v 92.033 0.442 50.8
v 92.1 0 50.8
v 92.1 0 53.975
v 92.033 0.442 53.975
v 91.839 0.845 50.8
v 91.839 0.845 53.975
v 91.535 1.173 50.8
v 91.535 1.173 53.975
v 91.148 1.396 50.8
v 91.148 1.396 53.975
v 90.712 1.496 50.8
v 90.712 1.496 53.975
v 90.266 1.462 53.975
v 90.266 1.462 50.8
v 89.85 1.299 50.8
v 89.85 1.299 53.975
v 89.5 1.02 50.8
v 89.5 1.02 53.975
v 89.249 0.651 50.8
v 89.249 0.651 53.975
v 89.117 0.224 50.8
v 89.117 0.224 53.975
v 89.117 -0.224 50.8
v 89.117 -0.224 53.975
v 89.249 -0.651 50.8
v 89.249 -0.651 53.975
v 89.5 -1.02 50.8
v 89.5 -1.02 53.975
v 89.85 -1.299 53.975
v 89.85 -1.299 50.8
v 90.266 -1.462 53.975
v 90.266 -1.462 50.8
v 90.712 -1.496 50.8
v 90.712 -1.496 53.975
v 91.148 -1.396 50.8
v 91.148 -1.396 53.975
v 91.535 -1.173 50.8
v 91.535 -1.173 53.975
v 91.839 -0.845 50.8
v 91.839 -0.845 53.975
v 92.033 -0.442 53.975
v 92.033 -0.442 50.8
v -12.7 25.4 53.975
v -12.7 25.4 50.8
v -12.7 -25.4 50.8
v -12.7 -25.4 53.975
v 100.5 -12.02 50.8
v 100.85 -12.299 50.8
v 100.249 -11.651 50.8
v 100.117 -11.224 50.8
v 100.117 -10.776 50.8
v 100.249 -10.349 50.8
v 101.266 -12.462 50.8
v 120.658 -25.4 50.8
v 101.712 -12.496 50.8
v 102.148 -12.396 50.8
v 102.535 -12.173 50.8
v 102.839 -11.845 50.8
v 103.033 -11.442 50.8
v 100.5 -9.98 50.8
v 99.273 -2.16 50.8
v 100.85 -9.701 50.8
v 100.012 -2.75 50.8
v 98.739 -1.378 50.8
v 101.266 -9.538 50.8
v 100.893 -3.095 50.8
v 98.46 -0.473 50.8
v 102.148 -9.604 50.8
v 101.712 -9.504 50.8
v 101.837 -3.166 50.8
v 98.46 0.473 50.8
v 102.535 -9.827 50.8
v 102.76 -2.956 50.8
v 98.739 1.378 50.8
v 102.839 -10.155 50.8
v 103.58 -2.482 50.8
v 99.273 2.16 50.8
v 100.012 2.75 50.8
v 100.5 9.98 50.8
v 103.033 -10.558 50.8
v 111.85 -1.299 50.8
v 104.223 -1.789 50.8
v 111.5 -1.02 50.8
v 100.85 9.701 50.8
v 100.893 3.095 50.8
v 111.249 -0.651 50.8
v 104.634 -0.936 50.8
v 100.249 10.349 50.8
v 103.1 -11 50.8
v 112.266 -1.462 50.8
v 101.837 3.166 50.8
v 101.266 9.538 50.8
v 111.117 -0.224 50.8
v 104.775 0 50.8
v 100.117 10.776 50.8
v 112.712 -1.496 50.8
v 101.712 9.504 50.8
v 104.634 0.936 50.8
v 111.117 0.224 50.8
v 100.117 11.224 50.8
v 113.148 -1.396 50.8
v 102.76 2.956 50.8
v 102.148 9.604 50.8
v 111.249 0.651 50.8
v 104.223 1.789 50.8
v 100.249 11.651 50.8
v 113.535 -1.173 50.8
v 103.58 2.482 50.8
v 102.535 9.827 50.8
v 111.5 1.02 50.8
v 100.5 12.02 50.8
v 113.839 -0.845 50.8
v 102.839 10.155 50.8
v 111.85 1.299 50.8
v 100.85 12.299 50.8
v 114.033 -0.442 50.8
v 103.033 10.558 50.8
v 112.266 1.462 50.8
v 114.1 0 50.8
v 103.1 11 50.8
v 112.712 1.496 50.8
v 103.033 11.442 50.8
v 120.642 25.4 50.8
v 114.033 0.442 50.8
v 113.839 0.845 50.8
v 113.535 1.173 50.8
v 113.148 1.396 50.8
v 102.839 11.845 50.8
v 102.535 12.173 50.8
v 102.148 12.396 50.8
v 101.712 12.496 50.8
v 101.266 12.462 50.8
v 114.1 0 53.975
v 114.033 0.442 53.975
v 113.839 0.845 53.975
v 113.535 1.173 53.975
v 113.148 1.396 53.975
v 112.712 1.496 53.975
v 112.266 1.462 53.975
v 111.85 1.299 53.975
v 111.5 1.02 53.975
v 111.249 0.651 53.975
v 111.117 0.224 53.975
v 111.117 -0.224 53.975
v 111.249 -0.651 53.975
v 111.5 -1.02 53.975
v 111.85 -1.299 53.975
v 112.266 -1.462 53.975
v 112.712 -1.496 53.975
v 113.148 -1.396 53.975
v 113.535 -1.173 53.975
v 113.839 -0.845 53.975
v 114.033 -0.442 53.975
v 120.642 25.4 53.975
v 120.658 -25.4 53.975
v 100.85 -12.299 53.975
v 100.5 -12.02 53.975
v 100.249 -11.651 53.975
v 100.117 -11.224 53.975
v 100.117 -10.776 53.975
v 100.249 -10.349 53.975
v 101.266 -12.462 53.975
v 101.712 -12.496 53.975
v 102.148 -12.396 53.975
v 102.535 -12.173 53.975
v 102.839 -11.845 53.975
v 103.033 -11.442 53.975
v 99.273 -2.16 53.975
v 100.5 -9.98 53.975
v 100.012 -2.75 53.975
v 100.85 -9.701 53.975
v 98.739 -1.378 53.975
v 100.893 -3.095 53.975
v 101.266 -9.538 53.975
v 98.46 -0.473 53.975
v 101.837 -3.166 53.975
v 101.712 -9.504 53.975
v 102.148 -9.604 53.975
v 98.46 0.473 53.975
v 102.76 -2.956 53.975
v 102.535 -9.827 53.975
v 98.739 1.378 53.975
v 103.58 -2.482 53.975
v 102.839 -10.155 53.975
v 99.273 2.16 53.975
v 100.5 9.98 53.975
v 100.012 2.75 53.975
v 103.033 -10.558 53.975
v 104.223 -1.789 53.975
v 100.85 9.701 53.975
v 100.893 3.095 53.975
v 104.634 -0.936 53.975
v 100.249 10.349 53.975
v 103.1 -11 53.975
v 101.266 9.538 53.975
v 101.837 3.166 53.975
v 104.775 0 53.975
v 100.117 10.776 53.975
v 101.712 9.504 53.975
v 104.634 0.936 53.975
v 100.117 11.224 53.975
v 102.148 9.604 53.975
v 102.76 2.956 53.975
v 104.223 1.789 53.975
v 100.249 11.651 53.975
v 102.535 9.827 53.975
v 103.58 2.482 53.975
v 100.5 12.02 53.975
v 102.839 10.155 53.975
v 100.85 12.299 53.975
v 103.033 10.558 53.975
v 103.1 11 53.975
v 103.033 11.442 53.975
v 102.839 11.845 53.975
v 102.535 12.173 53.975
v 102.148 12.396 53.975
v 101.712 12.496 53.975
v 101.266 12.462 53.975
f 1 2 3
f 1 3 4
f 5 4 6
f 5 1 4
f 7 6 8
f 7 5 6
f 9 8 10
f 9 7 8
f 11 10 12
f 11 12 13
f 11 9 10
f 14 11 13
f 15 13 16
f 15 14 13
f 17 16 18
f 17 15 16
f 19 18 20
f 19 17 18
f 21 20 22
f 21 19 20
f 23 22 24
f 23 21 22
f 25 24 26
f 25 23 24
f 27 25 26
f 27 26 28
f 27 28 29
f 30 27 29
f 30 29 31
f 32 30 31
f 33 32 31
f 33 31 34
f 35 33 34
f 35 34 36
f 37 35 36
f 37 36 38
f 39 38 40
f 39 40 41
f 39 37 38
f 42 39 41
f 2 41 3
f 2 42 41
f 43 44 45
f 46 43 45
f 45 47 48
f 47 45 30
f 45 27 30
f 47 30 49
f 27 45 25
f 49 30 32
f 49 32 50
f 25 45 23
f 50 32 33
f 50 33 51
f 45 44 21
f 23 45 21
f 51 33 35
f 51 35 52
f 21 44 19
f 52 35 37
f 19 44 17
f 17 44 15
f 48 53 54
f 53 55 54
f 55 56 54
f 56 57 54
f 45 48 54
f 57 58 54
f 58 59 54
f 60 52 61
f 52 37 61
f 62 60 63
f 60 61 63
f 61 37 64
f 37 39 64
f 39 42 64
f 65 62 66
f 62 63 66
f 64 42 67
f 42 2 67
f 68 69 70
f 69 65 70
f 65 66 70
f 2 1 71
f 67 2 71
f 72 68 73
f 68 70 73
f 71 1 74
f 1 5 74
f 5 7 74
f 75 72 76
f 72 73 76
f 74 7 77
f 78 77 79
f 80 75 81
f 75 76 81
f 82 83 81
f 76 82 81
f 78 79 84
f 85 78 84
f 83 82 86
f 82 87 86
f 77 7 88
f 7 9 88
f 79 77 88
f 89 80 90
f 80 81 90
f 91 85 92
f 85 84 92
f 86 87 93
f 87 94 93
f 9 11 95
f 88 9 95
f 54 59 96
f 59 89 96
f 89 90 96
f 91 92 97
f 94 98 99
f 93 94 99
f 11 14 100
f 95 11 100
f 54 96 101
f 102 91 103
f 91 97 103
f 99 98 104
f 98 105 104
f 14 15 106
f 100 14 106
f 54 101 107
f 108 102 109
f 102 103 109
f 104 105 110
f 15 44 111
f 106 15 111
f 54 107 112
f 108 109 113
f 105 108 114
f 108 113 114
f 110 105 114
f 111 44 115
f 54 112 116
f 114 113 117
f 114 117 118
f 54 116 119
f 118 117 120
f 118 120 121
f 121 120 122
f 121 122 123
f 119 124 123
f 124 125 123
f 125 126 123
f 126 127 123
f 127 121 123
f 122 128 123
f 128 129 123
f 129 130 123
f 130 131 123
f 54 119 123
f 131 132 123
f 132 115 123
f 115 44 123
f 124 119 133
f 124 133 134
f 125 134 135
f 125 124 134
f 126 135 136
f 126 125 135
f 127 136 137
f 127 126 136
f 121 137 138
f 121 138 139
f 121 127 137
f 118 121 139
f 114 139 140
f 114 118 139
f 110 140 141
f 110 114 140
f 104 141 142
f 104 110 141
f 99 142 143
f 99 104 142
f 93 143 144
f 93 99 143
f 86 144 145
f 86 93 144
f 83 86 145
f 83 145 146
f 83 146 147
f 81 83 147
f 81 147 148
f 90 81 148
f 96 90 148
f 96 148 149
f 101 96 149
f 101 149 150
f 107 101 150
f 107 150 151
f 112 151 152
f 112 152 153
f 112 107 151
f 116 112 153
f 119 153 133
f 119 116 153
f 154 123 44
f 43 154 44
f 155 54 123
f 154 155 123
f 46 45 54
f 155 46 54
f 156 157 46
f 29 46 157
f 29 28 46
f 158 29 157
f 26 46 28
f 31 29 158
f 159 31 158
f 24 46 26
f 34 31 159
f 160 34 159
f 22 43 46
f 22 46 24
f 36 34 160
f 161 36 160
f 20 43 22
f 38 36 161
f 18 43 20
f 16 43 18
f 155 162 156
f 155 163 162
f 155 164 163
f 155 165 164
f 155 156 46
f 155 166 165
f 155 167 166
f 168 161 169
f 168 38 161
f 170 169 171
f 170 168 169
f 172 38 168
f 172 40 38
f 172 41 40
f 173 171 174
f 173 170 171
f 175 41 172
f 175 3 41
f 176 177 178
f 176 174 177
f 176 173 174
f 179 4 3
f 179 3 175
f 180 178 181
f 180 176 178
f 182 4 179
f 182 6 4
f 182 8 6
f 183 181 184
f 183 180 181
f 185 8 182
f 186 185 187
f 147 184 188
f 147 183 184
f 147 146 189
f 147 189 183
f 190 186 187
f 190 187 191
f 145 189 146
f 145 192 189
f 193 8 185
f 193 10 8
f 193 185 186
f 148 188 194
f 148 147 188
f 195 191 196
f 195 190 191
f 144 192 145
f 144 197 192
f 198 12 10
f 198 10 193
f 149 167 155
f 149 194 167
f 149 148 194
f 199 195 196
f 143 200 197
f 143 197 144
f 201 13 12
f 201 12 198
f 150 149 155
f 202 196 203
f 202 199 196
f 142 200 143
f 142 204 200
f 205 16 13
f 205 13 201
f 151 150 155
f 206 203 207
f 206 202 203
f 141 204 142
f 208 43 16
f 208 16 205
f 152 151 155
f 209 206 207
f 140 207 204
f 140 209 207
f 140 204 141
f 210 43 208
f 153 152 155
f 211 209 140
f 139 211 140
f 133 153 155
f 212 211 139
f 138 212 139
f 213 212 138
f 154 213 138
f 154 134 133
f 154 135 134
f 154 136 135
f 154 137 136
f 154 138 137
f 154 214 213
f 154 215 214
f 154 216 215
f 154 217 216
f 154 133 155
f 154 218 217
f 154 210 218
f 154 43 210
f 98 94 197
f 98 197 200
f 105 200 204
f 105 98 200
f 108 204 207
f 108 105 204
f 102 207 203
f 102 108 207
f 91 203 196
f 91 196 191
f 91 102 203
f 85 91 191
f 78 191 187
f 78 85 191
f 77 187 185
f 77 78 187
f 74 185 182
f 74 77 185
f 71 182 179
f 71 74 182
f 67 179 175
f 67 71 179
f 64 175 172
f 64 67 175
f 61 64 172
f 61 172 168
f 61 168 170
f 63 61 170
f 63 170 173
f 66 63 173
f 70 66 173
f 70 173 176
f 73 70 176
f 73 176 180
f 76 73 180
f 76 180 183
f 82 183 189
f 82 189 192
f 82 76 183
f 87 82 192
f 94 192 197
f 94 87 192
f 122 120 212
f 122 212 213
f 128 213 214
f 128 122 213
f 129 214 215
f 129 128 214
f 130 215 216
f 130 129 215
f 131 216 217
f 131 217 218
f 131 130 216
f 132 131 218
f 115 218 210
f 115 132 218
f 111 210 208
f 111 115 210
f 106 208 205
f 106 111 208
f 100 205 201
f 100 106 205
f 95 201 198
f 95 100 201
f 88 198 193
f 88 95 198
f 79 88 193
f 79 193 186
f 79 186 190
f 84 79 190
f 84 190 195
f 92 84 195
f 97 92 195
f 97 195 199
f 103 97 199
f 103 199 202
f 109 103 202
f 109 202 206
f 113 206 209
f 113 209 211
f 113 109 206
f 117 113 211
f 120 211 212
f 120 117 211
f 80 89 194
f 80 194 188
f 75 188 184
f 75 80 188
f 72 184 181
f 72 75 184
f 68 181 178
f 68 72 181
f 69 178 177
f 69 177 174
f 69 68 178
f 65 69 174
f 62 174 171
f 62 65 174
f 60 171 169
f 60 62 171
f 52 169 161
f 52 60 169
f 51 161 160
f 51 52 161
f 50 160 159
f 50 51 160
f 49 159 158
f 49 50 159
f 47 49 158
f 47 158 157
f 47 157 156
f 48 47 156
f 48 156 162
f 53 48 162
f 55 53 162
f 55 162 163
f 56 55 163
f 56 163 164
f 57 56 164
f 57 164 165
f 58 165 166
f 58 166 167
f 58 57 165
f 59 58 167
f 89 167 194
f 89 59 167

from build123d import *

# Parameters (mm, degrees)
SKETCH1_R           = 3.175
SKETCH1_R_2         = 1.5
BOSS_EXTRUDE1_DEPTH = 3.175


with BuildPart() as part:
    # Sketch1 → Boss-Extrude1 (new body)
    with BuildSketch(Plane.XY.offset(50.8)):
        Polygon((0, 25.4), (-12.7, 25.4), (-12.7, -25.4), (0, -25.4), (120.657586649, -25.4), (120.64241505, 25.4), align=None)
        with Locations((101.6, 0)):
            Circle(SKETCH1_R, mode=Mode.SUBTRACT)
        with Locations((101.6, 11)):
            Circle(SKETCH1_R_2, mode=Mode.SUBTRACT)
        with Locations((112.6, 0)):
            Circle(SKETCH1_R_2, mode=Mode.SUBTRACT)
        with Locations((101.6, -11)):
            Circle(SKETCH1_R_2, mode=Mode.SUBTRACT)
        with Locations((90.6, 0)):
            Circle(SKETCH1_R_2, mode=Mode.SUBTRACT)
    extrude(amount=BOSS_EXTRUDE1_DEPTH)


solid = part.part
